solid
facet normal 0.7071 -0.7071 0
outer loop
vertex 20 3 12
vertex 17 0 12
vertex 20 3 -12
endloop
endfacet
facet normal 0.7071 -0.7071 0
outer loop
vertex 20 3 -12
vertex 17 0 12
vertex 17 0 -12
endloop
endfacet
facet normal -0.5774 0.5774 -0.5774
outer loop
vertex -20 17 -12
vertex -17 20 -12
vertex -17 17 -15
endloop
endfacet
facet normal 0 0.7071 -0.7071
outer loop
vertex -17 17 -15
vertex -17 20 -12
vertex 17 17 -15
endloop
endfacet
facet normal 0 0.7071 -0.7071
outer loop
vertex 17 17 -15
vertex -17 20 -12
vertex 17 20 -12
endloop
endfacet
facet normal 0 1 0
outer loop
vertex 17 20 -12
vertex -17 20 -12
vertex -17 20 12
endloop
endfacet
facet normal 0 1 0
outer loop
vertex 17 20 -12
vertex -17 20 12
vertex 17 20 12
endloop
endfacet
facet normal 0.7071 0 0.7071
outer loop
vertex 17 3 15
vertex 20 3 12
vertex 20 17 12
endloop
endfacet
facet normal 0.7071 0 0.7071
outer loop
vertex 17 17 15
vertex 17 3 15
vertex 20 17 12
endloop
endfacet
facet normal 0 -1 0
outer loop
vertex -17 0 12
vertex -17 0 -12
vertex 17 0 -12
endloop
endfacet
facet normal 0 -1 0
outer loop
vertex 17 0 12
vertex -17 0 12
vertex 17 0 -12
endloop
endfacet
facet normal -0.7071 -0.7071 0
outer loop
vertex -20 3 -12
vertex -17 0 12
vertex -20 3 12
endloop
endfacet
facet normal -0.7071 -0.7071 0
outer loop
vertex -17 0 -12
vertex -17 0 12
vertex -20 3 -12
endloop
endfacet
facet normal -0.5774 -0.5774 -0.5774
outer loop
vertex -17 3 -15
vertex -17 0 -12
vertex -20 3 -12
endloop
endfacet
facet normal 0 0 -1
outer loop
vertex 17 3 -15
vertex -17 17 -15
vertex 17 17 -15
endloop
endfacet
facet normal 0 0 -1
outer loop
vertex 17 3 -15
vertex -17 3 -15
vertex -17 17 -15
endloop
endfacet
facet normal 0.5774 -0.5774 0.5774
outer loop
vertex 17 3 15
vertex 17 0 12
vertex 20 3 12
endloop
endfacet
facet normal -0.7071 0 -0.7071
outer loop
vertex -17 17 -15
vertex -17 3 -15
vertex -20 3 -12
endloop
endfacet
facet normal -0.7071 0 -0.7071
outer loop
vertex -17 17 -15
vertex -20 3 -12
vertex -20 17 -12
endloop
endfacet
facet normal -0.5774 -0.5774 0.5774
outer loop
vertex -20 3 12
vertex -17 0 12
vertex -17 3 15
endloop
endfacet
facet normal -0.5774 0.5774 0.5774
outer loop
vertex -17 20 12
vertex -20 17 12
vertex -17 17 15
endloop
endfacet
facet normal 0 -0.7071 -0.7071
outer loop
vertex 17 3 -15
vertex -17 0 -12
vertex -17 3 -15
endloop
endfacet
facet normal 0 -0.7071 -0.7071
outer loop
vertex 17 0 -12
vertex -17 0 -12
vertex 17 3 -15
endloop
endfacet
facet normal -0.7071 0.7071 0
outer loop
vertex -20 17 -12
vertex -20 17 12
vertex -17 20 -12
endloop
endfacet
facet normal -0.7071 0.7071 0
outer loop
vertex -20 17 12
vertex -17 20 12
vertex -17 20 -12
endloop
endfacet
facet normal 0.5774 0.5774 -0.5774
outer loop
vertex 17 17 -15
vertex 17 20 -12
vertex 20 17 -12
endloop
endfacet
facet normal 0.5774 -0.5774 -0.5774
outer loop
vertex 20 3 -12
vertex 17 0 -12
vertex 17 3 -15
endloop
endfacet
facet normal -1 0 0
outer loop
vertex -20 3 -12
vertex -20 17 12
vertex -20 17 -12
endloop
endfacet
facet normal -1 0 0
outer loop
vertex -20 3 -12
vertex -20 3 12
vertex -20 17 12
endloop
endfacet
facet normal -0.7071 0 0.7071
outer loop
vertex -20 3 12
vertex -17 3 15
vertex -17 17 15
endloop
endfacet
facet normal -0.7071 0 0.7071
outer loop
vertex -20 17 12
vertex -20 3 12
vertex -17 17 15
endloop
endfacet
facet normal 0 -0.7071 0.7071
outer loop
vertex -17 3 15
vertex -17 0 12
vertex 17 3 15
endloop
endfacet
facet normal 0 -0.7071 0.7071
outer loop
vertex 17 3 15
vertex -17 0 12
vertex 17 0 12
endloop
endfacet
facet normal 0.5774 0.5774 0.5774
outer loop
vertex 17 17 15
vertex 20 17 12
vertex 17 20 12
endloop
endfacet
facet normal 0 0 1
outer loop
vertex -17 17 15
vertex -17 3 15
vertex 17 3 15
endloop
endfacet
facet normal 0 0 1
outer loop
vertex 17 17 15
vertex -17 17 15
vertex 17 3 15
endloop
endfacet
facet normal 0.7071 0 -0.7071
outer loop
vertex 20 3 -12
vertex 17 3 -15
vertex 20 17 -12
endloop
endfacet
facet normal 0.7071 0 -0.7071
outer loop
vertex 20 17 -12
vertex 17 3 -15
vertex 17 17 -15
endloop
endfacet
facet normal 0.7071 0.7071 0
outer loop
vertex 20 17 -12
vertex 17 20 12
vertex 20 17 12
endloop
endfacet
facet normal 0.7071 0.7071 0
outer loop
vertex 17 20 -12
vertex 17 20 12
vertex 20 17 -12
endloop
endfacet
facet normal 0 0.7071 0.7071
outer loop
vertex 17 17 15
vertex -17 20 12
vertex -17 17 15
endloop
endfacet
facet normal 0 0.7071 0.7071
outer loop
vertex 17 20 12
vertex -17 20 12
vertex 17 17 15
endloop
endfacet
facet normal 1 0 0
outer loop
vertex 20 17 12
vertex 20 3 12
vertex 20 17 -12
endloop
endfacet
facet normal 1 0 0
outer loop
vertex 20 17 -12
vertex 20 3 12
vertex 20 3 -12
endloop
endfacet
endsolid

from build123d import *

# Parameters (mm, degrees)
SKETCH1_W           = 40
SKETCH1_H           = 30
BOSS_EXTRUDE1_DEPTH = 20
CHAMFER1_SIZE2      = 2.99999902
CHAMFER1_SIZE       = 3


with BuildPart() as part:
    # Sketch1 → Boss-Extrude1 (new body)
    with BuildSketch(Plane(origin=(0, 0, 0), x_dir=(1, 0, 0), z_dir=(0, 1, 0))):
        Rectangle(SKETCH1_W, SKETCH1_H)
    extrude(amount=BOSS_EXTRUDE1_DEPTH)

    # Chamfer1
    chamfer1_edges = [part.edges().sort_by_distance(p)[0] for p in [
        (20, 20, 0),
        (0, 20, -15),
        (-20, 20, 0),
        (0, 0, -15),
        (20, 0, 0),
        (0, 0, 15),
        (-20, 0, 0),
        (-20, 10, -15),
        (20, 10, -15),
        (20, 10, 15),
        (-20, 10, 15),
        (0, 20, 15),
    ]]
    chamfer(chamfer1_edges, length=CHAMFER1_SIZE, length2=CHAMFER1_SIZE2)


solid = part.part
